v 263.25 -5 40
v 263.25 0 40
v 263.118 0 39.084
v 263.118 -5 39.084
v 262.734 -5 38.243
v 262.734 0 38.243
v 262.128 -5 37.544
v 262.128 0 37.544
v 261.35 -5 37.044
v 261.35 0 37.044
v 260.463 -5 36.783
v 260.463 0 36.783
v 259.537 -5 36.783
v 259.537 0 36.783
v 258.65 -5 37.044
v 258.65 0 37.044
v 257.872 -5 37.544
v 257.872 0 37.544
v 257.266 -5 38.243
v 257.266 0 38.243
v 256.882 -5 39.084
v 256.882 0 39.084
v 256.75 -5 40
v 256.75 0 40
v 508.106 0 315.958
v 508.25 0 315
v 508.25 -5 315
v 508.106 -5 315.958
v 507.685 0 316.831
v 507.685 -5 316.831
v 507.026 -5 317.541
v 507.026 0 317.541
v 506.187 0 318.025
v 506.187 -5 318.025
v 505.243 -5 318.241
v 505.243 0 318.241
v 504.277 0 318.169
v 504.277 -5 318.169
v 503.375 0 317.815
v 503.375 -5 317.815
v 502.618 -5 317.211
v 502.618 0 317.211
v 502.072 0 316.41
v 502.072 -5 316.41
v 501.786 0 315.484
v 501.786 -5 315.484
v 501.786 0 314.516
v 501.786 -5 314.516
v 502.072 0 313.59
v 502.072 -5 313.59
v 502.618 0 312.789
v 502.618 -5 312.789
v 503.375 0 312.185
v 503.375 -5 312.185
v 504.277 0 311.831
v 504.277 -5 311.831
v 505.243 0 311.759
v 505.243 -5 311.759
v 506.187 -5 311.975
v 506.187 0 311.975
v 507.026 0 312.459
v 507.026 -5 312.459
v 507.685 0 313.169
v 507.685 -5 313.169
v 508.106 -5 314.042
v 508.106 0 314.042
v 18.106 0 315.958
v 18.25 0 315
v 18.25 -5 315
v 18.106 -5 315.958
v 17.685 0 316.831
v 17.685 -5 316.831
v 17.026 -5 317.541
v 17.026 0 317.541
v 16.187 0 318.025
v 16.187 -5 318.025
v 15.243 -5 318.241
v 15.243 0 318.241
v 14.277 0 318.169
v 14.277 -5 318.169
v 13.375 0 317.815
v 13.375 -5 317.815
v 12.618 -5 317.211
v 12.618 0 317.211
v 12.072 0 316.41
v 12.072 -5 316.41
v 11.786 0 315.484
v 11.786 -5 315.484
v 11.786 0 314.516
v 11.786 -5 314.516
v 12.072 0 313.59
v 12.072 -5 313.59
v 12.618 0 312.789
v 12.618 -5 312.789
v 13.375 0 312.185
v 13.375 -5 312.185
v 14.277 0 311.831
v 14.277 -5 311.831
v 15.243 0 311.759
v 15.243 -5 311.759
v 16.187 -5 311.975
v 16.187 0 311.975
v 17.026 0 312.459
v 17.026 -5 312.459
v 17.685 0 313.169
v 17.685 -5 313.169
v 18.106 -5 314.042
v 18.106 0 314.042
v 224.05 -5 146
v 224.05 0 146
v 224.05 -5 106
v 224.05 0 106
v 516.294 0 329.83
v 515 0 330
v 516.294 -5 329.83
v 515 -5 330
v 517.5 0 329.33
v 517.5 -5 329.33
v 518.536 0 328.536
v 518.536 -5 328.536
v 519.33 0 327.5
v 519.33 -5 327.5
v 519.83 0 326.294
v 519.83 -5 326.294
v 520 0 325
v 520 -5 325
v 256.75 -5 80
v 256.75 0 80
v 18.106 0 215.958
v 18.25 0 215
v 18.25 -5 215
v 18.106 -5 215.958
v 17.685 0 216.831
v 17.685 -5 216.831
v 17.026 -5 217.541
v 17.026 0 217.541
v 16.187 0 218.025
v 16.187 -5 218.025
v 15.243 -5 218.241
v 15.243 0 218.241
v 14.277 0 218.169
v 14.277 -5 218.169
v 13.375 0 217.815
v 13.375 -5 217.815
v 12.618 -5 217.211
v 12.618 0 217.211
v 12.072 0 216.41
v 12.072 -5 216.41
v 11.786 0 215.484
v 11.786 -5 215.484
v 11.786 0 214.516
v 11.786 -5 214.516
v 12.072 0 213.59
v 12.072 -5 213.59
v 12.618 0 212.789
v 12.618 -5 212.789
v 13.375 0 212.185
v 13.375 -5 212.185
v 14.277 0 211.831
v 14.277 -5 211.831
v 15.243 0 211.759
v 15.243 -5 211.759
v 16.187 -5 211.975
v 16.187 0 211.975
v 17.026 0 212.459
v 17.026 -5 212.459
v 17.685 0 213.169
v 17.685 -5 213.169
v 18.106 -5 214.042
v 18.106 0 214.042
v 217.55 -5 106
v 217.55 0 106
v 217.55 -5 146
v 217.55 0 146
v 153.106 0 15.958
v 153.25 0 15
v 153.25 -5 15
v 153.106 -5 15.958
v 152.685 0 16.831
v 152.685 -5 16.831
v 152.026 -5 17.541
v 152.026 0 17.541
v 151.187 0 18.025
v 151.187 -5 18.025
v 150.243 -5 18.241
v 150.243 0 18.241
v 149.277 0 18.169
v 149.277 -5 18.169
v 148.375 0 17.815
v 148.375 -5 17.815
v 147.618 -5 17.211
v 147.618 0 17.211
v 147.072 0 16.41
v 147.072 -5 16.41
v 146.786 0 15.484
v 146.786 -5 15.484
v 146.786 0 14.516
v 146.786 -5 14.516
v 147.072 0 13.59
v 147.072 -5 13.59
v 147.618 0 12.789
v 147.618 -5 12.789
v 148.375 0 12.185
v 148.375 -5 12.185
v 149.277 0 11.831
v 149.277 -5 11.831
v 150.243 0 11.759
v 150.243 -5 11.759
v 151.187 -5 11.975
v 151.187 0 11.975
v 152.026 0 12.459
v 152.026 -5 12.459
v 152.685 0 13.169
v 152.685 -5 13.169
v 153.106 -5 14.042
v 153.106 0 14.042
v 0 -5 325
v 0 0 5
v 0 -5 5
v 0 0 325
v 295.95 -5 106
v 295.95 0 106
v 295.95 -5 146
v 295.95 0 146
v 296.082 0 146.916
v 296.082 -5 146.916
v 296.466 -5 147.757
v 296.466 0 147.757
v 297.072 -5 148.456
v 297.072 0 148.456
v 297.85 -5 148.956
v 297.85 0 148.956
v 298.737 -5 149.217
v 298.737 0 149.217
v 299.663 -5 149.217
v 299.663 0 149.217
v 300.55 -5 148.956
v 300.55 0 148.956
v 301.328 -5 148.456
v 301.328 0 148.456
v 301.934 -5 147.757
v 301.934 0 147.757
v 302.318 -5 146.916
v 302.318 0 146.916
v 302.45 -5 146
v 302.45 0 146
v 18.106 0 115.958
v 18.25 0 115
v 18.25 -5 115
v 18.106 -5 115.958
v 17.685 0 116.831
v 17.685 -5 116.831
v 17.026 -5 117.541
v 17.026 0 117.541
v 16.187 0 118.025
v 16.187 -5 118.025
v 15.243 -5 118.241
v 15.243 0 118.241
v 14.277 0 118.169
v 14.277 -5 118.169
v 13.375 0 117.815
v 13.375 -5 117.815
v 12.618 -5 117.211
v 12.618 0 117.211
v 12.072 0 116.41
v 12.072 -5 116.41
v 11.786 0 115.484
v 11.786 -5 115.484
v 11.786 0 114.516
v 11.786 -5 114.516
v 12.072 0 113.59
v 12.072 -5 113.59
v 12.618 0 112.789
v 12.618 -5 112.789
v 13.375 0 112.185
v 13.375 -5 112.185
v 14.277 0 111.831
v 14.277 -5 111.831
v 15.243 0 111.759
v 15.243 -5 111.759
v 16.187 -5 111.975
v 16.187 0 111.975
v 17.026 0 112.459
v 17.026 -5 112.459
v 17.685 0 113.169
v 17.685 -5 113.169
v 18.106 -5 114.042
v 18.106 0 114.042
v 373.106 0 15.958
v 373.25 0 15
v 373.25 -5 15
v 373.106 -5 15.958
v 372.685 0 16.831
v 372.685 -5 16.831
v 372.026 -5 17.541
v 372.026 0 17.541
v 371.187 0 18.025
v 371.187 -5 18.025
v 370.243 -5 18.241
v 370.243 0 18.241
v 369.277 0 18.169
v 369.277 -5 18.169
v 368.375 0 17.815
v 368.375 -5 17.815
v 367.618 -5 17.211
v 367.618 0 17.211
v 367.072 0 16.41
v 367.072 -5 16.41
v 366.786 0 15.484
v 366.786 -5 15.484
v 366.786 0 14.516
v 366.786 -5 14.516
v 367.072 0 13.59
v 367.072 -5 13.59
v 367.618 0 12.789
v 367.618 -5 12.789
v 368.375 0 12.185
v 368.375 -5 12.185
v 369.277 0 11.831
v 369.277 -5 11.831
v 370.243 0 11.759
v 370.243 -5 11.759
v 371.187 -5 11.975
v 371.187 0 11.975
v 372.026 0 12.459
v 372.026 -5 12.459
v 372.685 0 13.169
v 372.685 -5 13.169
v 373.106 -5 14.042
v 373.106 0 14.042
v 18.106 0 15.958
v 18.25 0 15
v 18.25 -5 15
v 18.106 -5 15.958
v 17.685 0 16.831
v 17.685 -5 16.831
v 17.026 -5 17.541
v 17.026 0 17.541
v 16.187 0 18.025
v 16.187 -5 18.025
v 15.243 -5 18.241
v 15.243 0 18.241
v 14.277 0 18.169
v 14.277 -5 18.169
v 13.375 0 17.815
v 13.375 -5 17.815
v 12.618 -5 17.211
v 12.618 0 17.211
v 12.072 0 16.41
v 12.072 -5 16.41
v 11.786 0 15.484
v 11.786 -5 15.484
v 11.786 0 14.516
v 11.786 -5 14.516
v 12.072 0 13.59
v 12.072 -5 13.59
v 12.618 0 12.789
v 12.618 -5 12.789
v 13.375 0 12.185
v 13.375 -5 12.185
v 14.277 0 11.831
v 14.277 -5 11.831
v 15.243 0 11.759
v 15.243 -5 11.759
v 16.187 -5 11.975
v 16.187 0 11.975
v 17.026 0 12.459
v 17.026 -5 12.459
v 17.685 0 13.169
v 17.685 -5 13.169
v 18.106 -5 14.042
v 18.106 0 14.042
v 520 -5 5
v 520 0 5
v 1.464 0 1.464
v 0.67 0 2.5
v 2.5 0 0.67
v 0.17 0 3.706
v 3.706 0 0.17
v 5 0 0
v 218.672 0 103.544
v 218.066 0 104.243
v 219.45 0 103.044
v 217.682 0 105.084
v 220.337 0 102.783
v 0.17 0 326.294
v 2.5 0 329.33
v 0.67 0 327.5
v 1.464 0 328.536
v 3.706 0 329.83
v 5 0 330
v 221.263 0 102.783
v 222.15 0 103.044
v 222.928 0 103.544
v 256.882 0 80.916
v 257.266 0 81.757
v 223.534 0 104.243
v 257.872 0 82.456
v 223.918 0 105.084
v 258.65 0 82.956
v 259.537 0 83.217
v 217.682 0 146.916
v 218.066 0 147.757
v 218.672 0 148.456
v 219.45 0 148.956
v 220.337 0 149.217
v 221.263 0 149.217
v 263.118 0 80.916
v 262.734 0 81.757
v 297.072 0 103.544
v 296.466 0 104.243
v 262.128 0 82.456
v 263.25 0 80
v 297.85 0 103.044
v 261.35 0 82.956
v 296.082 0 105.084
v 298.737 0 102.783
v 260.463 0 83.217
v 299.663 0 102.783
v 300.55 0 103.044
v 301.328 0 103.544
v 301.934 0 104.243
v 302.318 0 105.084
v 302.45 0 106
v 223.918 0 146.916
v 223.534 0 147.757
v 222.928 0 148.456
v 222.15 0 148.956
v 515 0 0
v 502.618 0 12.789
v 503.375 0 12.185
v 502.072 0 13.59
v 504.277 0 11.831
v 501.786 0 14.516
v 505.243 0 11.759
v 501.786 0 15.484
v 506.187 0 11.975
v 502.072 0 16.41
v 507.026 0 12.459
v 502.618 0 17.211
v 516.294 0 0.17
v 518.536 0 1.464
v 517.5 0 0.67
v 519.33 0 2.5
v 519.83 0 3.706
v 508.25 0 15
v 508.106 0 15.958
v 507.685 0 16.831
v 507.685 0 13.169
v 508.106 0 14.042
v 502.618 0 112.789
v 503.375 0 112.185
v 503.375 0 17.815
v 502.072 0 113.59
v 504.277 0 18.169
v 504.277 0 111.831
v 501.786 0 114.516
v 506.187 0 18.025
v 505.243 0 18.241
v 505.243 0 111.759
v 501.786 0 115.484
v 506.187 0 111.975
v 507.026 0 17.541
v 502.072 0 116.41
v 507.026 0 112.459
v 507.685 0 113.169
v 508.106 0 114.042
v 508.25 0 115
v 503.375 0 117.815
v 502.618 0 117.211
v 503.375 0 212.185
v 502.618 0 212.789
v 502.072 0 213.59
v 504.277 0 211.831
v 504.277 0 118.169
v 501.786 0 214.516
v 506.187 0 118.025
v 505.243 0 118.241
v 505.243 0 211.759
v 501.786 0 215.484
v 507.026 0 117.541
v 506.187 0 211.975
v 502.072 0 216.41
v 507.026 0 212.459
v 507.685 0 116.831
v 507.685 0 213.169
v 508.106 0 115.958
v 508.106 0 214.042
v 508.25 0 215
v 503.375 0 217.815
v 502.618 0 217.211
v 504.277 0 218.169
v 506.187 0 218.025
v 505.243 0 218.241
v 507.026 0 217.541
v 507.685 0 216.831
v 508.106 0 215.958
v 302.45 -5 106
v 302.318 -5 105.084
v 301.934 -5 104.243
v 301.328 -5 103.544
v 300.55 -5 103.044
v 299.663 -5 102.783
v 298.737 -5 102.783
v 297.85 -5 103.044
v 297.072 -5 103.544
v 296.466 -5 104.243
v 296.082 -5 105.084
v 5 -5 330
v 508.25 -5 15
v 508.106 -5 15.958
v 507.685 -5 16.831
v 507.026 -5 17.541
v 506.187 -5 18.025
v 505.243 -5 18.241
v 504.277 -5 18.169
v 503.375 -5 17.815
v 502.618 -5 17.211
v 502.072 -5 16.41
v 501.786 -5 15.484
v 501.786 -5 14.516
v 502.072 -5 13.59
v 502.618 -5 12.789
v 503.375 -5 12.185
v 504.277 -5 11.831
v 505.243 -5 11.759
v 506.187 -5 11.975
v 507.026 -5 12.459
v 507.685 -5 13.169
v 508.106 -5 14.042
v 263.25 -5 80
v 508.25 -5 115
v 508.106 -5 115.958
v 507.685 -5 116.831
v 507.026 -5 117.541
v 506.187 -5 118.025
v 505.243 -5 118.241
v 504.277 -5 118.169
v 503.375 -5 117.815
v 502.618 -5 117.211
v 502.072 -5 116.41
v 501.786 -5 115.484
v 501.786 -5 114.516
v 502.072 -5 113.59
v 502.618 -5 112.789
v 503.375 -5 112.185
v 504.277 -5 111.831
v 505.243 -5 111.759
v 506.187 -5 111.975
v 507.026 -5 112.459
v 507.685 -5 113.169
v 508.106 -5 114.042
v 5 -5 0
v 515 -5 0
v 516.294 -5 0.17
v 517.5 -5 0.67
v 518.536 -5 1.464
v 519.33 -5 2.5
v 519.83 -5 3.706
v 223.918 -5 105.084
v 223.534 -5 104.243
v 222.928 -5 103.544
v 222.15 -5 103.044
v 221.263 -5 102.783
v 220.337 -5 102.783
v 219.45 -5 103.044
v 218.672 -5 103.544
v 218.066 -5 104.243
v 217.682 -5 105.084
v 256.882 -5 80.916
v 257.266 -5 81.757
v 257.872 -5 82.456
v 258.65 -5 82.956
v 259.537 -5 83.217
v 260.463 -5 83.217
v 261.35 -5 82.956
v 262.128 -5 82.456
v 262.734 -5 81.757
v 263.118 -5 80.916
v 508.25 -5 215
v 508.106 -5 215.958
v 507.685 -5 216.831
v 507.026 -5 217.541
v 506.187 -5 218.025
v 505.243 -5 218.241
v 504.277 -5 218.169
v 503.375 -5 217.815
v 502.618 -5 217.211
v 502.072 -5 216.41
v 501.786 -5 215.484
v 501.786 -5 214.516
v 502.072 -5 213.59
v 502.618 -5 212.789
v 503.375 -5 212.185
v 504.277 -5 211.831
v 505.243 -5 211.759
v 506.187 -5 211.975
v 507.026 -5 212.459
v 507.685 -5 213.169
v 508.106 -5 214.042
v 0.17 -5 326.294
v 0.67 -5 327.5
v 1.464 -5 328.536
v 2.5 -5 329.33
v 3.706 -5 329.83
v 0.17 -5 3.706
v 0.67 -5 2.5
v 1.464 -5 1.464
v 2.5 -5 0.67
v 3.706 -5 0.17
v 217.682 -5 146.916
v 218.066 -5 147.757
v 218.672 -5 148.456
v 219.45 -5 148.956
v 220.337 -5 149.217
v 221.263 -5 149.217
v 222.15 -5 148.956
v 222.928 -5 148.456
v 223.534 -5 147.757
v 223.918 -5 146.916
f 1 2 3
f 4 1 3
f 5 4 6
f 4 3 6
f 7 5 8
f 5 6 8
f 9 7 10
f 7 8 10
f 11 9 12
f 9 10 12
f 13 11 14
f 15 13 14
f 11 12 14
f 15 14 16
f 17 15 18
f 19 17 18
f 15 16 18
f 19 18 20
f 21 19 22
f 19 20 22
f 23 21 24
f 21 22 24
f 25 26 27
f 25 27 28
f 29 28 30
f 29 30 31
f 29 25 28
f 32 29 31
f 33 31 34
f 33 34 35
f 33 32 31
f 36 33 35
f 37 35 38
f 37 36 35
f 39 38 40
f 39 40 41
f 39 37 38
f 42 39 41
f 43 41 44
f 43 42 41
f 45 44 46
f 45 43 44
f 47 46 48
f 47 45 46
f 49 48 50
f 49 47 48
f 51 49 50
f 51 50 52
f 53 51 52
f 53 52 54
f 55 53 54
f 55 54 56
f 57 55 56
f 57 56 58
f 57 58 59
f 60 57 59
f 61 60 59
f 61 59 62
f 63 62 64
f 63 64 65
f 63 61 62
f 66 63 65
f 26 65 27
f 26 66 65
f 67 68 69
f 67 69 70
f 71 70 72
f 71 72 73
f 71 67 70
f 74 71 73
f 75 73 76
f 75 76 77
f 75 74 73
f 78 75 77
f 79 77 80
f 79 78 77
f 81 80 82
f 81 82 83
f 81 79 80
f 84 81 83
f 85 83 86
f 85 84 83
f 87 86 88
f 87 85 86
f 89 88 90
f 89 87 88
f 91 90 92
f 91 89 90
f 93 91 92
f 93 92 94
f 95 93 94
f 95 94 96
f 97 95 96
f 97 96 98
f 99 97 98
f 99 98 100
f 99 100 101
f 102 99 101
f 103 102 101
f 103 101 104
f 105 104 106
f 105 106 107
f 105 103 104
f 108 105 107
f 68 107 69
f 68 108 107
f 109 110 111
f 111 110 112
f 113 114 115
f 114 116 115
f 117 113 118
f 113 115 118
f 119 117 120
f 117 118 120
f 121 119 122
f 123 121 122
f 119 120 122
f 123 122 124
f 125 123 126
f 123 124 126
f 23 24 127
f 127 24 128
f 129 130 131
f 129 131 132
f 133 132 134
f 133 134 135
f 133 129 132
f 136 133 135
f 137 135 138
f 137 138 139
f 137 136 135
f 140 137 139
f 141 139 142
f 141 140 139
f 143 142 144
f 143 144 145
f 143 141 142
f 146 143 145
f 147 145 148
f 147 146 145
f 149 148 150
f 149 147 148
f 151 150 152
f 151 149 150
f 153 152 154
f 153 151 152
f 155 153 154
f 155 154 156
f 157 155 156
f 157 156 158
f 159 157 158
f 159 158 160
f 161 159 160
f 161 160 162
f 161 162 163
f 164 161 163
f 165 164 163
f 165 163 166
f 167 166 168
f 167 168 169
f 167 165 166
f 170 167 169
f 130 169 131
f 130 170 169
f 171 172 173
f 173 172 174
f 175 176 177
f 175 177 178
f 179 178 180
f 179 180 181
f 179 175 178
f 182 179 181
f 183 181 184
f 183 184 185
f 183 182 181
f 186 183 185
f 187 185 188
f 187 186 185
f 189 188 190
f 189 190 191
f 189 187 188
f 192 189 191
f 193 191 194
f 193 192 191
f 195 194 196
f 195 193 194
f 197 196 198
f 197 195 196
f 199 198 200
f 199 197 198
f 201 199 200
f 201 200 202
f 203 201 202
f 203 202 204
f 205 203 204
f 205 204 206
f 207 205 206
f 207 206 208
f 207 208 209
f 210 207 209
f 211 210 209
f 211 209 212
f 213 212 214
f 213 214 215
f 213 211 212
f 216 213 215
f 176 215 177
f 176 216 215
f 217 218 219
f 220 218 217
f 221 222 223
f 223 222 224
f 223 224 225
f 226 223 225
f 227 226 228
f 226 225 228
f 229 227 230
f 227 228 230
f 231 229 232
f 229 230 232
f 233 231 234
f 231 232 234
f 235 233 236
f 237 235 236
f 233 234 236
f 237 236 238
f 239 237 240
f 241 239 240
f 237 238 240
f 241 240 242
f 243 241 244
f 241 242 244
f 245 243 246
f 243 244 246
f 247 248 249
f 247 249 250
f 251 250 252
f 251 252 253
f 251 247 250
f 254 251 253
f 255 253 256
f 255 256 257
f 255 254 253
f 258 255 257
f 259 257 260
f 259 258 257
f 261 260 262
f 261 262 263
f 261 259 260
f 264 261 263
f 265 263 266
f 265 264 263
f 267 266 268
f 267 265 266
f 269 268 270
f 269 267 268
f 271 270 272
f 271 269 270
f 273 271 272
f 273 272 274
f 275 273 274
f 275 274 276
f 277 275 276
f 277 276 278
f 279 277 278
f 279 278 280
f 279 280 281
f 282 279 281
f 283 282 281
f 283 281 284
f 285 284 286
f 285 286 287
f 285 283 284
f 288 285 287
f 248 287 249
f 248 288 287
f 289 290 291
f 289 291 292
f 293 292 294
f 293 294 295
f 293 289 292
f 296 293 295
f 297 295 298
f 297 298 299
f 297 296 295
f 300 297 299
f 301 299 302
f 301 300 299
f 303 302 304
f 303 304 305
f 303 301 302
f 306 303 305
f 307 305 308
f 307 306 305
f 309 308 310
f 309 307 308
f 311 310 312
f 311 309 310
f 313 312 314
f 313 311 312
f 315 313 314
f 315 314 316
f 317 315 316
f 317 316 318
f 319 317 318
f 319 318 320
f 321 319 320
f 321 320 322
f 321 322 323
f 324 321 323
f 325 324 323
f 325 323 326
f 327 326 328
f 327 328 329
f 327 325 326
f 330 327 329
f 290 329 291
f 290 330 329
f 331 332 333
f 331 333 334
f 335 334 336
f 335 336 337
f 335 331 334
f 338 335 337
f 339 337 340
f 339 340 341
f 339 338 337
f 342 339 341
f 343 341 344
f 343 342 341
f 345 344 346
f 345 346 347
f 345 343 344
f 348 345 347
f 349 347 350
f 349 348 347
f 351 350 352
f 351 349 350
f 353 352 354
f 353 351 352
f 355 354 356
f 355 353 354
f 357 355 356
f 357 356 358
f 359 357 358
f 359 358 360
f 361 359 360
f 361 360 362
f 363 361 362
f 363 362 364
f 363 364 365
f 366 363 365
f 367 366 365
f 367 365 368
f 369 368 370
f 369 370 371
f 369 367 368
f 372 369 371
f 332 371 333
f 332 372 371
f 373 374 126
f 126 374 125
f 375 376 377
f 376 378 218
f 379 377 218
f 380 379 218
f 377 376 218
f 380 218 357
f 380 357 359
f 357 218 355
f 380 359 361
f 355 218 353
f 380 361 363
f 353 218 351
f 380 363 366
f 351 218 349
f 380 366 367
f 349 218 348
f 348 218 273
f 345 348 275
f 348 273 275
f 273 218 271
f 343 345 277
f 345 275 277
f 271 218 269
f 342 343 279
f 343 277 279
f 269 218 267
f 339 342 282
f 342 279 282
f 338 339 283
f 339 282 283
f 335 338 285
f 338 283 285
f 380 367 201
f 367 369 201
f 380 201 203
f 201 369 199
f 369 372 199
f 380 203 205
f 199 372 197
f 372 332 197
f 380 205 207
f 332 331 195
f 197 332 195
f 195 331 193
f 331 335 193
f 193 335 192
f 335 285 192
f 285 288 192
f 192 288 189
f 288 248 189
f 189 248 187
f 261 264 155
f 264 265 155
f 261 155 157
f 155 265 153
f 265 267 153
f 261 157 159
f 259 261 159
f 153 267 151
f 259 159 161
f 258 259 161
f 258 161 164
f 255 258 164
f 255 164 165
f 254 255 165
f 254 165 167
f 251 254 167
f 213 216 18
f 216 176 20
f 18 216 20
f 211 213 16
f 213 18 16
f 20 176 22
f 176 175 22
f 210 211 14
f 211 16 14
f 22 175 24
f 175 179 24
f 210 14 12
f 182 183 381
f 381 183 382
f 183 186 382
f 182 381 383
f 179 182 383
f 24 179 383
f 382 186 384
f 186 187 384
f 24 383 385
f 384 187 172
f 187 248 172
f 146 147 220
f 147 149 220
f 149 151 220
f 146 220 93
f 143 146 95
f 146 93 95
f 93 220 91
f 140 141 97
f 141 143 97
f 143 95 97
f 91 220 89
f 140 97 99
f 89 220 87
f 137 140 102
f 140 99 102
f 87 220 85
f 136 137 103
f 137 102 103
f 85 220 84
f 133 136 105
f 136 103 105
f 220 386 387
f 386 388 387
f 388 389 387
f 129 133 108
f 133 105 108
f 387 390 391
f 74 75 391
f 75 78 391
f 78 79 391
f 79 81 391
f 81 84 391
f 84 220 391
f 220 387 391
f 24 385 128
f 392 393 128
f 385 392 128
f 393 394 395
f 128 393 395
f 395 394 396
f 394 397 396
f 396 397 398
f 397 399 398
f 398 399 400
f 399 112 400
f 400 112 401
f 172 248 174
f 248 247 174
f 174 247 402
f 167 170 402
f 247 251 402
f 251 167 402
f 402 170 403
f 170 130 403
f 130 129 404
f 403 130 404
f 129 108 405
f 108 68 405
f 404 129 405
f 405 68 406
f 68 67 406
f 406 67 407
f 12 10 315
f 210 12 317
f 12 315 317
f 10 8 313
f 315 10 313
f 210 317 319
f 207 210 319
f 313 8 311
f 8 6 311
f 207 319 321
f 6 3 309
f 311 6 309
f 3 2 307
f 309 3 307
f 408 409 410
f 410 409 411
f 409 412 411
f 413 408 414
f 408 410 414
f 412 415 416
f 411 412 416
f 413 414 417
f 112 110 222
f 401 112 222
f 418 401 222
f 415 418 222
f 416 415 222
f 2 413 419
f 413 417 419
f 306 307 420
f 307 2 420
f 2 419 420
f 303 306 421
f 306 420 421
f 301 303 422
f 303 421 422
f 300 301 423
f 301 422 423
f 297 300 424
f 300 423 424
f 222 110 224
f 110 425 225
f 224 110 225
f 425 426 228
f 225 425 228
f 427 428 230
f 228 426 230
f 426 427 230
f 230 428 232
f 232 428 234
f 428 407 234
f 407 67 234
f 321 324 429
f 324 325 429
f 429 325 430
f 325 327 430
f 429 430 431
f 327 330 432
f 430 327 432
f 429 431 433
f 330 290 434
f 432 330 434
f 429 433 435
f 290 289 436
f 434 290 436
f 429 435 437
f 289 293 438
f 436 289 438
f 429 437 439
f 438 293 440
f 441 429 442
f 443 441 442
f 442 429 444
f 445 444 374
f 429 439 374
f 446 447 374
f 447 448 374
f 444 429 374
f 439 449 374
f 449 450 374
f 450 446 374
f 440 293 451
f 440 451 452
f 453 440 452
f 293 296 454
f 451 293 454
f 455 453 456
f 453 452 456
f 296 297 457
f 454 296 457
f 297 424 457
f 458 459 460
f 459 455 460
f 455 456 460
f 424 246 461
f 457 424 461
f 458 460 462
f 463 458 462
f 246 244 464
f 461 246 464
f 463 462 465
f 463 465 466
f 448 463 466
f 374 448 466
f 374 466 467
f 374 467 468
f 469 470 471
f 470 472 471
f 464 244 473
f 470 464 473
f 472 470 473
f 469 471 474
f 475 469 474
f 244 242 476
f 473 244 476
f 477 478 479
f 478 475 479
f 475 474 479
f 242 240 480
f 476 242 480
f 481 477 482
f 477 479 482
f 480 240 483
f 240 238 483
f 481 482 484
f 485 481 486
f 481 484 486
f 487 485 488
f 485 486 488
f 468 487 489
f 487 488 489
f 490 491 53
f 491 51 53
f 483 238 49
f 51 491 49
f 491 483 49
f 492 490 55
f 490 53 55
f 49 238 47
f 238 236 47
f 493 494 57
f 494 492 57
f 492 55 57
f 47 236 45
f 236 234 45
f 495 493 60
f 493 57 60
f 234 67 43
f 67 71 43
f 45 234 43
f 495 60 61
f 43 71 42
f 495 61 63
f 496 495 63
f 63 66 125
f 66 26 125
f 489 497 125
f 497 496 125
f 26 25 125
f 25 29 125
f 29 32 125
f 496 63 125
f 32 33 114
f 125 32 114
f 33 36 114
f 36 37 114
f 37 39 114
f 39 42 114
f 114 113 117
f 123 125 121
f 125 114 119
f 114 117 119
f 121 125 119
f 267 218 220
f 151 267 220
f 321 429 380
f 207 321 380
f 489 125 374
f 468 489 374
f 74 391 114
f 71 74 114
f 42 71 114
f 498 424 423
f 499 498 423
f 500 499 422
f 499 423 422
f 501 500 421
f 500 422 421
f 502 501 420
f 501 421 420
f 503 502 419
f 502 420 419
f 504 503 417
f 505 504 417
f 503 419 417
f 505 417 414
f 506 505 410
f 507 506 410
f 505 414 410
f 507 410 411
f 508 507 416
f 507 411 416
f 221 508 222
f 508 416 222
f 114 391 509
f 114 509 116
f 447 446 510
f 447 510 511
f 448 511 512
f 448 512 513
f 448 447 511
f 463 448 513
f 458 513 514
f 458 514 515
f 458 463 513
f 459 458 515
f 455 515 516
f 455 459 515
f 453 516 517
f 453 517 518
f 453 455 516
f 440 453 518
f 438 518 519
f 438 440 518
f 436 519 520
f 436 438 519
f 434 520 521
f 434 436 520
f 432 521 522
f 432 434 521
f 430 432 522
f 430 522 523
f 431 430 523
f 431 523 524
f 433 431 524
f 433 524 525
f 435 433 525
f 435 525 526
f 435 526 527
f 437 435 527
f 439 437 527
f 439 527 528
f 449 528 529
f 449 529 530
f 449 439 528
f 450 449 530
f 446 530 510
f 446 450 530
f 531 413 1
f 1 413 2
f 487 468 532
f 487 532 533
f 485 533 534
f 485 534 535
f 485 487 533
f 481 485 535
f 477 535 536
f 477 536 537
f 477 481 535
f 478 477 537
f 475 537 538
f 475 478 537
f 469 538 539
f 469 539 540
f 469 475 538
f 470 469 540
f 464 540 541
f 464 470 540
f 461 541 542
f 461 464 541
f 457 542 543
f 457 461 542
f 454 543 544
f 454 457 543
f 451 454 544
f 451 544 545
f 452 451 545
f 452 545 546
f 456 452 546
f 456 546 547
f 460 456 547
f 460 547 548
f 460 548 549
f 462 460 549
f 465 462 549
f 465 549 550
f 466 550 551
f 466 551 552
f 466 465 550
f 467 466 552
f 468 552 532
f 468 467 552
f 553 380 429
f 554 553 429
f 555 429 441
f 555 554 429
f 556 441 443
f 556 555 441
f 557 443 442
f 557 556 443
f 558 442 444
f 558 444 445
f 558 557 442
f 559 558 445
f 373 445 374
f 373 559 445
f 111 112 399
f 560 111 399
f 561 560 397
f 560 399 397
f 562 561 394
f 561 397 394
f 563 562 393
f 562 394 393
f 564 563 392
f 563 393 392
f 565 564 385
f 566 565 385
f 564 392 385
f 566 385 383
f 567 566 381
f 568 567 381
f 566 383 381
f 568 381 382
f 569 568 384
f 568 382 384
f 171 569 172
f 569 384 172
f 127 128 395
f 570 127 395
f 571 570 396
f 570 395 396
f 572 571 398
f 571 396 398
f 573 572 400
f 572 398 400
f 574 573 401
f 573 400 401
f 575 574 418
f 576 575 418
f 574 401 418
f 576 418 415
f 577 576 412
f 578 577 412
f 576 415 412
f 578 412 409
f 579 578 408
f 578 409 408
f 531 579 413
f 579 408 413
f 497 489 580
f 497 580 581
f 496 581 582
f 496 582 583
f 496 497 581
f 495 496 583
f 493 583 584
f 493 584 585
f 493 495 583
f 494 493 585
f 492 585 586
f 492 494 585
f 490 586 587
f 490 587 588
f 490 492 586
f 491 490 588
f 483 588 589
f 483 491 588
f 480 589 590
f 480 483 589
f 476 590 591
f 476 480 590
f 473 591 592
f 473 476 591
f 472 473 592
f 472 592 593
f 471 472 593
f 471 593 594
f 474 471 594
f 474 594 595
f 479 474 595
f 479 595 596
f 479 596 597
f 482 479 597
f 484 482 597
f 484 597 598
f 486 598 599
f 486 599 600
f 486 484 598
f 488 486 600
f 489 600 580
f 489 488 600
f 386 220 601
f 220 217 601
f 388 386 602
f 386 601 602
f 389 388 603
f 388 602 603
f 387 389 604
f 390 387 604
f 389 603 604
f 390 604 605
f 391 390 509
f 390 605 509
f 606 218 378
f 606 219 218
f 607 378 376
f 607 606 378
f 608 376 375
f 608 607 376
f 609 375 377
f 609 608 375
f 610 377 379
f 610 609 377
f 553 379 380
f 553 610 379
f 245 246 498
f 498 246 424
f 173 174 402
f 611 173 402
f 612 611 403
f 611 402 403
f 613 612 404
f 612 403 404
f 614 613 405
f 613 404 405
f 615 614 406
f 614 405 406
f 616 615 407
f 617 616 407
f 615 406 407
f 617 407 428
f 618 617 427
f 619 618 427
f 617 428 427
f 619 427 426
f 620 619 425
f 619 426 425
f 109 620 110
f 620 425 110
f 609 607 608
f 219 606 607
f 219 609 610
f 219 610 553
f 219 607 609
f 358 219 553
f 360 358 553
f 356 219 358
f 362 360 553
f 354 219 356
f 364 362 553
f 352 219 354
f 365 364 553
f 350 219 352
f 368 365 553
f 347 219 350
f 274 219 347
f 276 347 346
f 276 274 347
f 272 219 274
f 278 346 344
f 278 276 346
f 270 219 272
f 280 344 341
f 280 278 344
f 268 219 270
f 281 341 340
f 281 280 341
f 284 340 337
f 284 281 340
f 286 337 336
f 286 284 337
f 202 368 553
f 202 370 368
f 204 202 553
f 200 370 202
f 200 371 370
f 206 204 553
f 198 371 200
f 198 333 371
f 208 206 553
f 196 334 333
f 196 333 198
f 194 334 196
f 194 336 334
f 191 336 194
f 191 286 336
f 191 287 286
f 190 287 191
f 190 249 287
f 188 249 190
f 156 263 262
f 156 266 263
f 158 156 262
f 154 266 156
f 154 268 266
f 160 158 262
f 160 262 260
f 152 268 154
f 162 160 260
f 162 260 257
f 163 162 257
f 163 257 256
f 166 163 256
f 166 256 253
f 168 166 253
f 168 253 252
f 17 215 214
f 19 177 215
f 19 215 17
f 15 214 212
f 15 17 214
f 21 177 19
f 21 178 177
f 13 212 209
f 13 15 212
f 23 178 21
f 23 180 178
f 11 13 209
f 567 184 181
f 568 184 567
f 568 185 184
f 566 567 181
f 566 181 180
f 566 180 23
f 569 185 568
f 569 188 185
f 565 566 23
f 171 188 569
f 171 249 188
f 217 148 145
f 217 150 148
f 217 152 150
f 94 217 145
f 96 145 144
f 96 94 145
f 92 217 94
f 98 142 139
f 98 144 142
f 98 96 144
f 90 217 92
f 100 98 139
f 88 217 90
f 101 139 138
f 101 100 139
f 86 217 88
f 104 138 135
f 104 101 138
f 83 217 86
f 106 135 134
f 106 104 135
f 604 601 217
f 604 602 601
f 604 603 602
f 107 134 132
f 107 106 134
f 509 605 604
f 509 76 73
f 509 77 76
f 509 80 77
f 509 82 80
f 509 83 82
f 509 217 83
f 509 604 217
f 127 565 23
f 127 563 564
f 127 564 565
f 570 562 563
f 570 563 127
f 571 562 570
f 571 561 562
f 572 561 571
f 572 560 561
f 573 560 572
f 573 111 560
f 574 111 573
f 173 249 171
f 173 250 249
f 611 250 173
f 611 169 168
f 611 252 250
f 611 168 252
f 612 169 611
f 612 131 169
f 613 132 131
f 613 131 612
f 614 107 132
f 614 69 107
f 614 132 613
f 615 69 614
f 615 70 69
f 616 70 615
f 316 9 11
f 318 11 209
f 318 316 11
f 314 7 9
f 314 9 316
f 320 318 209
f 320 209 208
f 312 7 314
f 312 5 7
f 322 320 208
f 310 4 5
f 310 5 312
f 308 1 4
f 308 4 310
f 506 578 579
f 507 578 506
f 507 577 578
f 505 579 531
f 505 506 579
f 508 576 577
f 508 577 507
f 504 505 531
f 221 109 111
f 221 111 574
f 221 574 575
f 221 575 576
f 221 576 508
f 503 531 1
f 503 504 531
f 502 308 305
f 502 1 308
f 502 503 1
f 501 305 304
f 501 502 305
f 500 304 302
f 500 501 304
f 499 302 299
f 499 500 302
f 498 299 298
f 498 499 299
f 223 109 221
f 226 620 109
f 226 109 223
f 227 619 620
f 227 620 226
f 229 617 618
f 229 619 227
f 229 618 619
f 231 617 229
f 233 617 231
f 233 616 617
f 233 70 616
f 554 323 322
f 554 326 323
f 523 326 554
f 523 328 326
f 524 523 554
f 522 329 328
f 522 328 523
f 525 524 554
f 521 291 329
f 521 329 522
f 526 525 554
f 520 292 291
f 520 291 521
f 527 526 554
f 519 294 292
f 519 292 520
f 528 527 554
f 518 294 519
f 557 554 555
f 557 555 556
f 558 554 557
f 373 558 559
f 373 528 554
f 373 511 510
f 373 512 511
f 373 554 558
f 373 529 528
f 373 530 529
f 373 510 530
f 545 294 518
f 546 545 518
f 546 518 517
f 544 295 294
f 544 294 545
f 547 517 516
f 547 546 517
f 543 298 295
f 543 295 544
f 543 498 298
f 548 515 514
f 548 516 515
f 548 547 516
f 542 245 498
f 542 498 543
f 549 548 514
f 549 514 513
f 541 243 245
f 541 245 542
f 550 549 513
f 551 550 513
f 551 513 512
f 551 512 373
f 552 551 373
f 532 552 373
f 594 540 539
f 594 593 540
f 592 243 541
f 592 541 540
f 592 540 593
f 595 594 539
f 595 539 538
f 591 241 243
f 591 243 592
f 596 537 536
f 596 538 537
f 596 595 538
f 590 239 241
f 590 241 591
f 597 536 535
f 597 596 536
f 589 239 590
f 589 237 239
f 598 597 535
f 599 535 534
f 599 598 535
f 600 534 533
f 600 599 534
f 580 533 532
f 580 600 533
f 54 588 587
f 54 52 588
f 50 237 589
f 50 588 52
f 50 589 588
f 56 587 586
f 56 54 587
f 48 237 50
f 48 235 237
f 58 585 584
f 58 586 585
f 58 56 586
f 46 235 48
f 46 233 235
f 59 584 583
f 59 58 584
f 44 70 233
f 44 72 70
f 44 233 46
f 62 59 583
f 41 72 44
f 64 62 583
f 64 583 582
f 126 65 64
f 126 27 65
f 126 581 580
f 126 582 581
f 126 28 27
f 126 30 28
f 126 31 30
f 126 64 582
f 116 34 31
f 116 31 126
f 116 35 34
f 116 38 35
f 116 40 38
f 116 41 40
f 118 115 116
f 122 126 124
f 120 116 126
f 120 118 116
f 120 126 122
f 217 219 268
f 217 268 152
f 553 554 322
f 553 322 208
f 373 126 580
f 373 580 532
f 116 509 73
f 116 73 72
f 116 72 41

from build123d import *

# Parameters (mm, degrees)
F0_W     = 520
F0_H     = 330
F0_R     = 3.25
F1_DEPTH = 5
F2_R     = 5


with BuildPart() as f1:
    # F0 (on Front) → F1 (new body)
    with BuildSketch(Plane.XZ):
        with Locations((260, 165)):
            Rectangle(F0_W, F0_H)
        with Locations((15, 15)):
            Circle(F0_R, mode=Mode.SUBTRACT)
        with Locations((150, 15)):
            Circle(F0_R, mode=Mode.SUBTRACT)
        with Locations((15, 115)):
            Circle(F0_R, mode=Mode.SUBTRACT)
        with BuildLine():
            Line((217.55, 106), (217.55, 146))
            ThreePointArc((217.55, 146), (220.8, 149.25), (224.05, 146))
            Line((224.05, 146), (224.05, 106))
            ThreePointArc((224.05, 106), (220.8, 102.75), (217.55, 106))
        make_face(mode=Mode.SUBTRACT)
        with Locations((370, 15)):
            Circle(F0_R, mode=Mode.SUBTRACT)
        with BuildLine():
            Line((256.75, 40), (256.75, 80))
            ThreePointArc((256.75, 80), (260, 83.25), (263.25, 80))
            Line((263.25, 80), (263.25, 40))
            ThreePointArc((263.25, 40), (260, 36.75), (256.75, 40))
        make_face(mode=Mode.SUBTRACT)
        with Locations((505, 15)):
            Circle(F0_R, mode=Mode.SUBTRACT)
        with BuildLine():
            Line((295.95, 106), (295.95, 146))
            ThreePointArc((295.95, 146), (299.2, 149.25), (302.45, 146))
            Line((302.45, 146), (302.45, 106))
            ThreePointArc((302.45, 106), (299.2, 102.75), (295.95, 106))
        make_face(mode=Mode.SUBTRACT)
        with Locations((505, 115)):
            Circle(F0_R, mode=Mode.SUBTRACT)
        with Locations((15, 215)):
            Circle(F0_R, mode=Mode.SUBTRACT)
        with Locations((15, 315)):
            Circle(F0_R, mode=Mode.SUBTRACT)
        with Locations((505, 215)):
            Circle(F0_R, mode=Mode.SUBTRACT)
        with Locations((505, 315)):
            Circle(F0_R, mode=Mode.SUBTRACT)
    extrude(amount=F1_DEPTH)

    # F2
    f2_edges = [f1.edges().sort_by_distance(p)[0] for p in [
        (520, -2.5, 330),
        (520, -2.5, 0),
        (0, -2.5, 0),
        (0, -2.5, 330),
    ]]
    fillet(f2_edges, radius=F2_R)


solid = f1.part
